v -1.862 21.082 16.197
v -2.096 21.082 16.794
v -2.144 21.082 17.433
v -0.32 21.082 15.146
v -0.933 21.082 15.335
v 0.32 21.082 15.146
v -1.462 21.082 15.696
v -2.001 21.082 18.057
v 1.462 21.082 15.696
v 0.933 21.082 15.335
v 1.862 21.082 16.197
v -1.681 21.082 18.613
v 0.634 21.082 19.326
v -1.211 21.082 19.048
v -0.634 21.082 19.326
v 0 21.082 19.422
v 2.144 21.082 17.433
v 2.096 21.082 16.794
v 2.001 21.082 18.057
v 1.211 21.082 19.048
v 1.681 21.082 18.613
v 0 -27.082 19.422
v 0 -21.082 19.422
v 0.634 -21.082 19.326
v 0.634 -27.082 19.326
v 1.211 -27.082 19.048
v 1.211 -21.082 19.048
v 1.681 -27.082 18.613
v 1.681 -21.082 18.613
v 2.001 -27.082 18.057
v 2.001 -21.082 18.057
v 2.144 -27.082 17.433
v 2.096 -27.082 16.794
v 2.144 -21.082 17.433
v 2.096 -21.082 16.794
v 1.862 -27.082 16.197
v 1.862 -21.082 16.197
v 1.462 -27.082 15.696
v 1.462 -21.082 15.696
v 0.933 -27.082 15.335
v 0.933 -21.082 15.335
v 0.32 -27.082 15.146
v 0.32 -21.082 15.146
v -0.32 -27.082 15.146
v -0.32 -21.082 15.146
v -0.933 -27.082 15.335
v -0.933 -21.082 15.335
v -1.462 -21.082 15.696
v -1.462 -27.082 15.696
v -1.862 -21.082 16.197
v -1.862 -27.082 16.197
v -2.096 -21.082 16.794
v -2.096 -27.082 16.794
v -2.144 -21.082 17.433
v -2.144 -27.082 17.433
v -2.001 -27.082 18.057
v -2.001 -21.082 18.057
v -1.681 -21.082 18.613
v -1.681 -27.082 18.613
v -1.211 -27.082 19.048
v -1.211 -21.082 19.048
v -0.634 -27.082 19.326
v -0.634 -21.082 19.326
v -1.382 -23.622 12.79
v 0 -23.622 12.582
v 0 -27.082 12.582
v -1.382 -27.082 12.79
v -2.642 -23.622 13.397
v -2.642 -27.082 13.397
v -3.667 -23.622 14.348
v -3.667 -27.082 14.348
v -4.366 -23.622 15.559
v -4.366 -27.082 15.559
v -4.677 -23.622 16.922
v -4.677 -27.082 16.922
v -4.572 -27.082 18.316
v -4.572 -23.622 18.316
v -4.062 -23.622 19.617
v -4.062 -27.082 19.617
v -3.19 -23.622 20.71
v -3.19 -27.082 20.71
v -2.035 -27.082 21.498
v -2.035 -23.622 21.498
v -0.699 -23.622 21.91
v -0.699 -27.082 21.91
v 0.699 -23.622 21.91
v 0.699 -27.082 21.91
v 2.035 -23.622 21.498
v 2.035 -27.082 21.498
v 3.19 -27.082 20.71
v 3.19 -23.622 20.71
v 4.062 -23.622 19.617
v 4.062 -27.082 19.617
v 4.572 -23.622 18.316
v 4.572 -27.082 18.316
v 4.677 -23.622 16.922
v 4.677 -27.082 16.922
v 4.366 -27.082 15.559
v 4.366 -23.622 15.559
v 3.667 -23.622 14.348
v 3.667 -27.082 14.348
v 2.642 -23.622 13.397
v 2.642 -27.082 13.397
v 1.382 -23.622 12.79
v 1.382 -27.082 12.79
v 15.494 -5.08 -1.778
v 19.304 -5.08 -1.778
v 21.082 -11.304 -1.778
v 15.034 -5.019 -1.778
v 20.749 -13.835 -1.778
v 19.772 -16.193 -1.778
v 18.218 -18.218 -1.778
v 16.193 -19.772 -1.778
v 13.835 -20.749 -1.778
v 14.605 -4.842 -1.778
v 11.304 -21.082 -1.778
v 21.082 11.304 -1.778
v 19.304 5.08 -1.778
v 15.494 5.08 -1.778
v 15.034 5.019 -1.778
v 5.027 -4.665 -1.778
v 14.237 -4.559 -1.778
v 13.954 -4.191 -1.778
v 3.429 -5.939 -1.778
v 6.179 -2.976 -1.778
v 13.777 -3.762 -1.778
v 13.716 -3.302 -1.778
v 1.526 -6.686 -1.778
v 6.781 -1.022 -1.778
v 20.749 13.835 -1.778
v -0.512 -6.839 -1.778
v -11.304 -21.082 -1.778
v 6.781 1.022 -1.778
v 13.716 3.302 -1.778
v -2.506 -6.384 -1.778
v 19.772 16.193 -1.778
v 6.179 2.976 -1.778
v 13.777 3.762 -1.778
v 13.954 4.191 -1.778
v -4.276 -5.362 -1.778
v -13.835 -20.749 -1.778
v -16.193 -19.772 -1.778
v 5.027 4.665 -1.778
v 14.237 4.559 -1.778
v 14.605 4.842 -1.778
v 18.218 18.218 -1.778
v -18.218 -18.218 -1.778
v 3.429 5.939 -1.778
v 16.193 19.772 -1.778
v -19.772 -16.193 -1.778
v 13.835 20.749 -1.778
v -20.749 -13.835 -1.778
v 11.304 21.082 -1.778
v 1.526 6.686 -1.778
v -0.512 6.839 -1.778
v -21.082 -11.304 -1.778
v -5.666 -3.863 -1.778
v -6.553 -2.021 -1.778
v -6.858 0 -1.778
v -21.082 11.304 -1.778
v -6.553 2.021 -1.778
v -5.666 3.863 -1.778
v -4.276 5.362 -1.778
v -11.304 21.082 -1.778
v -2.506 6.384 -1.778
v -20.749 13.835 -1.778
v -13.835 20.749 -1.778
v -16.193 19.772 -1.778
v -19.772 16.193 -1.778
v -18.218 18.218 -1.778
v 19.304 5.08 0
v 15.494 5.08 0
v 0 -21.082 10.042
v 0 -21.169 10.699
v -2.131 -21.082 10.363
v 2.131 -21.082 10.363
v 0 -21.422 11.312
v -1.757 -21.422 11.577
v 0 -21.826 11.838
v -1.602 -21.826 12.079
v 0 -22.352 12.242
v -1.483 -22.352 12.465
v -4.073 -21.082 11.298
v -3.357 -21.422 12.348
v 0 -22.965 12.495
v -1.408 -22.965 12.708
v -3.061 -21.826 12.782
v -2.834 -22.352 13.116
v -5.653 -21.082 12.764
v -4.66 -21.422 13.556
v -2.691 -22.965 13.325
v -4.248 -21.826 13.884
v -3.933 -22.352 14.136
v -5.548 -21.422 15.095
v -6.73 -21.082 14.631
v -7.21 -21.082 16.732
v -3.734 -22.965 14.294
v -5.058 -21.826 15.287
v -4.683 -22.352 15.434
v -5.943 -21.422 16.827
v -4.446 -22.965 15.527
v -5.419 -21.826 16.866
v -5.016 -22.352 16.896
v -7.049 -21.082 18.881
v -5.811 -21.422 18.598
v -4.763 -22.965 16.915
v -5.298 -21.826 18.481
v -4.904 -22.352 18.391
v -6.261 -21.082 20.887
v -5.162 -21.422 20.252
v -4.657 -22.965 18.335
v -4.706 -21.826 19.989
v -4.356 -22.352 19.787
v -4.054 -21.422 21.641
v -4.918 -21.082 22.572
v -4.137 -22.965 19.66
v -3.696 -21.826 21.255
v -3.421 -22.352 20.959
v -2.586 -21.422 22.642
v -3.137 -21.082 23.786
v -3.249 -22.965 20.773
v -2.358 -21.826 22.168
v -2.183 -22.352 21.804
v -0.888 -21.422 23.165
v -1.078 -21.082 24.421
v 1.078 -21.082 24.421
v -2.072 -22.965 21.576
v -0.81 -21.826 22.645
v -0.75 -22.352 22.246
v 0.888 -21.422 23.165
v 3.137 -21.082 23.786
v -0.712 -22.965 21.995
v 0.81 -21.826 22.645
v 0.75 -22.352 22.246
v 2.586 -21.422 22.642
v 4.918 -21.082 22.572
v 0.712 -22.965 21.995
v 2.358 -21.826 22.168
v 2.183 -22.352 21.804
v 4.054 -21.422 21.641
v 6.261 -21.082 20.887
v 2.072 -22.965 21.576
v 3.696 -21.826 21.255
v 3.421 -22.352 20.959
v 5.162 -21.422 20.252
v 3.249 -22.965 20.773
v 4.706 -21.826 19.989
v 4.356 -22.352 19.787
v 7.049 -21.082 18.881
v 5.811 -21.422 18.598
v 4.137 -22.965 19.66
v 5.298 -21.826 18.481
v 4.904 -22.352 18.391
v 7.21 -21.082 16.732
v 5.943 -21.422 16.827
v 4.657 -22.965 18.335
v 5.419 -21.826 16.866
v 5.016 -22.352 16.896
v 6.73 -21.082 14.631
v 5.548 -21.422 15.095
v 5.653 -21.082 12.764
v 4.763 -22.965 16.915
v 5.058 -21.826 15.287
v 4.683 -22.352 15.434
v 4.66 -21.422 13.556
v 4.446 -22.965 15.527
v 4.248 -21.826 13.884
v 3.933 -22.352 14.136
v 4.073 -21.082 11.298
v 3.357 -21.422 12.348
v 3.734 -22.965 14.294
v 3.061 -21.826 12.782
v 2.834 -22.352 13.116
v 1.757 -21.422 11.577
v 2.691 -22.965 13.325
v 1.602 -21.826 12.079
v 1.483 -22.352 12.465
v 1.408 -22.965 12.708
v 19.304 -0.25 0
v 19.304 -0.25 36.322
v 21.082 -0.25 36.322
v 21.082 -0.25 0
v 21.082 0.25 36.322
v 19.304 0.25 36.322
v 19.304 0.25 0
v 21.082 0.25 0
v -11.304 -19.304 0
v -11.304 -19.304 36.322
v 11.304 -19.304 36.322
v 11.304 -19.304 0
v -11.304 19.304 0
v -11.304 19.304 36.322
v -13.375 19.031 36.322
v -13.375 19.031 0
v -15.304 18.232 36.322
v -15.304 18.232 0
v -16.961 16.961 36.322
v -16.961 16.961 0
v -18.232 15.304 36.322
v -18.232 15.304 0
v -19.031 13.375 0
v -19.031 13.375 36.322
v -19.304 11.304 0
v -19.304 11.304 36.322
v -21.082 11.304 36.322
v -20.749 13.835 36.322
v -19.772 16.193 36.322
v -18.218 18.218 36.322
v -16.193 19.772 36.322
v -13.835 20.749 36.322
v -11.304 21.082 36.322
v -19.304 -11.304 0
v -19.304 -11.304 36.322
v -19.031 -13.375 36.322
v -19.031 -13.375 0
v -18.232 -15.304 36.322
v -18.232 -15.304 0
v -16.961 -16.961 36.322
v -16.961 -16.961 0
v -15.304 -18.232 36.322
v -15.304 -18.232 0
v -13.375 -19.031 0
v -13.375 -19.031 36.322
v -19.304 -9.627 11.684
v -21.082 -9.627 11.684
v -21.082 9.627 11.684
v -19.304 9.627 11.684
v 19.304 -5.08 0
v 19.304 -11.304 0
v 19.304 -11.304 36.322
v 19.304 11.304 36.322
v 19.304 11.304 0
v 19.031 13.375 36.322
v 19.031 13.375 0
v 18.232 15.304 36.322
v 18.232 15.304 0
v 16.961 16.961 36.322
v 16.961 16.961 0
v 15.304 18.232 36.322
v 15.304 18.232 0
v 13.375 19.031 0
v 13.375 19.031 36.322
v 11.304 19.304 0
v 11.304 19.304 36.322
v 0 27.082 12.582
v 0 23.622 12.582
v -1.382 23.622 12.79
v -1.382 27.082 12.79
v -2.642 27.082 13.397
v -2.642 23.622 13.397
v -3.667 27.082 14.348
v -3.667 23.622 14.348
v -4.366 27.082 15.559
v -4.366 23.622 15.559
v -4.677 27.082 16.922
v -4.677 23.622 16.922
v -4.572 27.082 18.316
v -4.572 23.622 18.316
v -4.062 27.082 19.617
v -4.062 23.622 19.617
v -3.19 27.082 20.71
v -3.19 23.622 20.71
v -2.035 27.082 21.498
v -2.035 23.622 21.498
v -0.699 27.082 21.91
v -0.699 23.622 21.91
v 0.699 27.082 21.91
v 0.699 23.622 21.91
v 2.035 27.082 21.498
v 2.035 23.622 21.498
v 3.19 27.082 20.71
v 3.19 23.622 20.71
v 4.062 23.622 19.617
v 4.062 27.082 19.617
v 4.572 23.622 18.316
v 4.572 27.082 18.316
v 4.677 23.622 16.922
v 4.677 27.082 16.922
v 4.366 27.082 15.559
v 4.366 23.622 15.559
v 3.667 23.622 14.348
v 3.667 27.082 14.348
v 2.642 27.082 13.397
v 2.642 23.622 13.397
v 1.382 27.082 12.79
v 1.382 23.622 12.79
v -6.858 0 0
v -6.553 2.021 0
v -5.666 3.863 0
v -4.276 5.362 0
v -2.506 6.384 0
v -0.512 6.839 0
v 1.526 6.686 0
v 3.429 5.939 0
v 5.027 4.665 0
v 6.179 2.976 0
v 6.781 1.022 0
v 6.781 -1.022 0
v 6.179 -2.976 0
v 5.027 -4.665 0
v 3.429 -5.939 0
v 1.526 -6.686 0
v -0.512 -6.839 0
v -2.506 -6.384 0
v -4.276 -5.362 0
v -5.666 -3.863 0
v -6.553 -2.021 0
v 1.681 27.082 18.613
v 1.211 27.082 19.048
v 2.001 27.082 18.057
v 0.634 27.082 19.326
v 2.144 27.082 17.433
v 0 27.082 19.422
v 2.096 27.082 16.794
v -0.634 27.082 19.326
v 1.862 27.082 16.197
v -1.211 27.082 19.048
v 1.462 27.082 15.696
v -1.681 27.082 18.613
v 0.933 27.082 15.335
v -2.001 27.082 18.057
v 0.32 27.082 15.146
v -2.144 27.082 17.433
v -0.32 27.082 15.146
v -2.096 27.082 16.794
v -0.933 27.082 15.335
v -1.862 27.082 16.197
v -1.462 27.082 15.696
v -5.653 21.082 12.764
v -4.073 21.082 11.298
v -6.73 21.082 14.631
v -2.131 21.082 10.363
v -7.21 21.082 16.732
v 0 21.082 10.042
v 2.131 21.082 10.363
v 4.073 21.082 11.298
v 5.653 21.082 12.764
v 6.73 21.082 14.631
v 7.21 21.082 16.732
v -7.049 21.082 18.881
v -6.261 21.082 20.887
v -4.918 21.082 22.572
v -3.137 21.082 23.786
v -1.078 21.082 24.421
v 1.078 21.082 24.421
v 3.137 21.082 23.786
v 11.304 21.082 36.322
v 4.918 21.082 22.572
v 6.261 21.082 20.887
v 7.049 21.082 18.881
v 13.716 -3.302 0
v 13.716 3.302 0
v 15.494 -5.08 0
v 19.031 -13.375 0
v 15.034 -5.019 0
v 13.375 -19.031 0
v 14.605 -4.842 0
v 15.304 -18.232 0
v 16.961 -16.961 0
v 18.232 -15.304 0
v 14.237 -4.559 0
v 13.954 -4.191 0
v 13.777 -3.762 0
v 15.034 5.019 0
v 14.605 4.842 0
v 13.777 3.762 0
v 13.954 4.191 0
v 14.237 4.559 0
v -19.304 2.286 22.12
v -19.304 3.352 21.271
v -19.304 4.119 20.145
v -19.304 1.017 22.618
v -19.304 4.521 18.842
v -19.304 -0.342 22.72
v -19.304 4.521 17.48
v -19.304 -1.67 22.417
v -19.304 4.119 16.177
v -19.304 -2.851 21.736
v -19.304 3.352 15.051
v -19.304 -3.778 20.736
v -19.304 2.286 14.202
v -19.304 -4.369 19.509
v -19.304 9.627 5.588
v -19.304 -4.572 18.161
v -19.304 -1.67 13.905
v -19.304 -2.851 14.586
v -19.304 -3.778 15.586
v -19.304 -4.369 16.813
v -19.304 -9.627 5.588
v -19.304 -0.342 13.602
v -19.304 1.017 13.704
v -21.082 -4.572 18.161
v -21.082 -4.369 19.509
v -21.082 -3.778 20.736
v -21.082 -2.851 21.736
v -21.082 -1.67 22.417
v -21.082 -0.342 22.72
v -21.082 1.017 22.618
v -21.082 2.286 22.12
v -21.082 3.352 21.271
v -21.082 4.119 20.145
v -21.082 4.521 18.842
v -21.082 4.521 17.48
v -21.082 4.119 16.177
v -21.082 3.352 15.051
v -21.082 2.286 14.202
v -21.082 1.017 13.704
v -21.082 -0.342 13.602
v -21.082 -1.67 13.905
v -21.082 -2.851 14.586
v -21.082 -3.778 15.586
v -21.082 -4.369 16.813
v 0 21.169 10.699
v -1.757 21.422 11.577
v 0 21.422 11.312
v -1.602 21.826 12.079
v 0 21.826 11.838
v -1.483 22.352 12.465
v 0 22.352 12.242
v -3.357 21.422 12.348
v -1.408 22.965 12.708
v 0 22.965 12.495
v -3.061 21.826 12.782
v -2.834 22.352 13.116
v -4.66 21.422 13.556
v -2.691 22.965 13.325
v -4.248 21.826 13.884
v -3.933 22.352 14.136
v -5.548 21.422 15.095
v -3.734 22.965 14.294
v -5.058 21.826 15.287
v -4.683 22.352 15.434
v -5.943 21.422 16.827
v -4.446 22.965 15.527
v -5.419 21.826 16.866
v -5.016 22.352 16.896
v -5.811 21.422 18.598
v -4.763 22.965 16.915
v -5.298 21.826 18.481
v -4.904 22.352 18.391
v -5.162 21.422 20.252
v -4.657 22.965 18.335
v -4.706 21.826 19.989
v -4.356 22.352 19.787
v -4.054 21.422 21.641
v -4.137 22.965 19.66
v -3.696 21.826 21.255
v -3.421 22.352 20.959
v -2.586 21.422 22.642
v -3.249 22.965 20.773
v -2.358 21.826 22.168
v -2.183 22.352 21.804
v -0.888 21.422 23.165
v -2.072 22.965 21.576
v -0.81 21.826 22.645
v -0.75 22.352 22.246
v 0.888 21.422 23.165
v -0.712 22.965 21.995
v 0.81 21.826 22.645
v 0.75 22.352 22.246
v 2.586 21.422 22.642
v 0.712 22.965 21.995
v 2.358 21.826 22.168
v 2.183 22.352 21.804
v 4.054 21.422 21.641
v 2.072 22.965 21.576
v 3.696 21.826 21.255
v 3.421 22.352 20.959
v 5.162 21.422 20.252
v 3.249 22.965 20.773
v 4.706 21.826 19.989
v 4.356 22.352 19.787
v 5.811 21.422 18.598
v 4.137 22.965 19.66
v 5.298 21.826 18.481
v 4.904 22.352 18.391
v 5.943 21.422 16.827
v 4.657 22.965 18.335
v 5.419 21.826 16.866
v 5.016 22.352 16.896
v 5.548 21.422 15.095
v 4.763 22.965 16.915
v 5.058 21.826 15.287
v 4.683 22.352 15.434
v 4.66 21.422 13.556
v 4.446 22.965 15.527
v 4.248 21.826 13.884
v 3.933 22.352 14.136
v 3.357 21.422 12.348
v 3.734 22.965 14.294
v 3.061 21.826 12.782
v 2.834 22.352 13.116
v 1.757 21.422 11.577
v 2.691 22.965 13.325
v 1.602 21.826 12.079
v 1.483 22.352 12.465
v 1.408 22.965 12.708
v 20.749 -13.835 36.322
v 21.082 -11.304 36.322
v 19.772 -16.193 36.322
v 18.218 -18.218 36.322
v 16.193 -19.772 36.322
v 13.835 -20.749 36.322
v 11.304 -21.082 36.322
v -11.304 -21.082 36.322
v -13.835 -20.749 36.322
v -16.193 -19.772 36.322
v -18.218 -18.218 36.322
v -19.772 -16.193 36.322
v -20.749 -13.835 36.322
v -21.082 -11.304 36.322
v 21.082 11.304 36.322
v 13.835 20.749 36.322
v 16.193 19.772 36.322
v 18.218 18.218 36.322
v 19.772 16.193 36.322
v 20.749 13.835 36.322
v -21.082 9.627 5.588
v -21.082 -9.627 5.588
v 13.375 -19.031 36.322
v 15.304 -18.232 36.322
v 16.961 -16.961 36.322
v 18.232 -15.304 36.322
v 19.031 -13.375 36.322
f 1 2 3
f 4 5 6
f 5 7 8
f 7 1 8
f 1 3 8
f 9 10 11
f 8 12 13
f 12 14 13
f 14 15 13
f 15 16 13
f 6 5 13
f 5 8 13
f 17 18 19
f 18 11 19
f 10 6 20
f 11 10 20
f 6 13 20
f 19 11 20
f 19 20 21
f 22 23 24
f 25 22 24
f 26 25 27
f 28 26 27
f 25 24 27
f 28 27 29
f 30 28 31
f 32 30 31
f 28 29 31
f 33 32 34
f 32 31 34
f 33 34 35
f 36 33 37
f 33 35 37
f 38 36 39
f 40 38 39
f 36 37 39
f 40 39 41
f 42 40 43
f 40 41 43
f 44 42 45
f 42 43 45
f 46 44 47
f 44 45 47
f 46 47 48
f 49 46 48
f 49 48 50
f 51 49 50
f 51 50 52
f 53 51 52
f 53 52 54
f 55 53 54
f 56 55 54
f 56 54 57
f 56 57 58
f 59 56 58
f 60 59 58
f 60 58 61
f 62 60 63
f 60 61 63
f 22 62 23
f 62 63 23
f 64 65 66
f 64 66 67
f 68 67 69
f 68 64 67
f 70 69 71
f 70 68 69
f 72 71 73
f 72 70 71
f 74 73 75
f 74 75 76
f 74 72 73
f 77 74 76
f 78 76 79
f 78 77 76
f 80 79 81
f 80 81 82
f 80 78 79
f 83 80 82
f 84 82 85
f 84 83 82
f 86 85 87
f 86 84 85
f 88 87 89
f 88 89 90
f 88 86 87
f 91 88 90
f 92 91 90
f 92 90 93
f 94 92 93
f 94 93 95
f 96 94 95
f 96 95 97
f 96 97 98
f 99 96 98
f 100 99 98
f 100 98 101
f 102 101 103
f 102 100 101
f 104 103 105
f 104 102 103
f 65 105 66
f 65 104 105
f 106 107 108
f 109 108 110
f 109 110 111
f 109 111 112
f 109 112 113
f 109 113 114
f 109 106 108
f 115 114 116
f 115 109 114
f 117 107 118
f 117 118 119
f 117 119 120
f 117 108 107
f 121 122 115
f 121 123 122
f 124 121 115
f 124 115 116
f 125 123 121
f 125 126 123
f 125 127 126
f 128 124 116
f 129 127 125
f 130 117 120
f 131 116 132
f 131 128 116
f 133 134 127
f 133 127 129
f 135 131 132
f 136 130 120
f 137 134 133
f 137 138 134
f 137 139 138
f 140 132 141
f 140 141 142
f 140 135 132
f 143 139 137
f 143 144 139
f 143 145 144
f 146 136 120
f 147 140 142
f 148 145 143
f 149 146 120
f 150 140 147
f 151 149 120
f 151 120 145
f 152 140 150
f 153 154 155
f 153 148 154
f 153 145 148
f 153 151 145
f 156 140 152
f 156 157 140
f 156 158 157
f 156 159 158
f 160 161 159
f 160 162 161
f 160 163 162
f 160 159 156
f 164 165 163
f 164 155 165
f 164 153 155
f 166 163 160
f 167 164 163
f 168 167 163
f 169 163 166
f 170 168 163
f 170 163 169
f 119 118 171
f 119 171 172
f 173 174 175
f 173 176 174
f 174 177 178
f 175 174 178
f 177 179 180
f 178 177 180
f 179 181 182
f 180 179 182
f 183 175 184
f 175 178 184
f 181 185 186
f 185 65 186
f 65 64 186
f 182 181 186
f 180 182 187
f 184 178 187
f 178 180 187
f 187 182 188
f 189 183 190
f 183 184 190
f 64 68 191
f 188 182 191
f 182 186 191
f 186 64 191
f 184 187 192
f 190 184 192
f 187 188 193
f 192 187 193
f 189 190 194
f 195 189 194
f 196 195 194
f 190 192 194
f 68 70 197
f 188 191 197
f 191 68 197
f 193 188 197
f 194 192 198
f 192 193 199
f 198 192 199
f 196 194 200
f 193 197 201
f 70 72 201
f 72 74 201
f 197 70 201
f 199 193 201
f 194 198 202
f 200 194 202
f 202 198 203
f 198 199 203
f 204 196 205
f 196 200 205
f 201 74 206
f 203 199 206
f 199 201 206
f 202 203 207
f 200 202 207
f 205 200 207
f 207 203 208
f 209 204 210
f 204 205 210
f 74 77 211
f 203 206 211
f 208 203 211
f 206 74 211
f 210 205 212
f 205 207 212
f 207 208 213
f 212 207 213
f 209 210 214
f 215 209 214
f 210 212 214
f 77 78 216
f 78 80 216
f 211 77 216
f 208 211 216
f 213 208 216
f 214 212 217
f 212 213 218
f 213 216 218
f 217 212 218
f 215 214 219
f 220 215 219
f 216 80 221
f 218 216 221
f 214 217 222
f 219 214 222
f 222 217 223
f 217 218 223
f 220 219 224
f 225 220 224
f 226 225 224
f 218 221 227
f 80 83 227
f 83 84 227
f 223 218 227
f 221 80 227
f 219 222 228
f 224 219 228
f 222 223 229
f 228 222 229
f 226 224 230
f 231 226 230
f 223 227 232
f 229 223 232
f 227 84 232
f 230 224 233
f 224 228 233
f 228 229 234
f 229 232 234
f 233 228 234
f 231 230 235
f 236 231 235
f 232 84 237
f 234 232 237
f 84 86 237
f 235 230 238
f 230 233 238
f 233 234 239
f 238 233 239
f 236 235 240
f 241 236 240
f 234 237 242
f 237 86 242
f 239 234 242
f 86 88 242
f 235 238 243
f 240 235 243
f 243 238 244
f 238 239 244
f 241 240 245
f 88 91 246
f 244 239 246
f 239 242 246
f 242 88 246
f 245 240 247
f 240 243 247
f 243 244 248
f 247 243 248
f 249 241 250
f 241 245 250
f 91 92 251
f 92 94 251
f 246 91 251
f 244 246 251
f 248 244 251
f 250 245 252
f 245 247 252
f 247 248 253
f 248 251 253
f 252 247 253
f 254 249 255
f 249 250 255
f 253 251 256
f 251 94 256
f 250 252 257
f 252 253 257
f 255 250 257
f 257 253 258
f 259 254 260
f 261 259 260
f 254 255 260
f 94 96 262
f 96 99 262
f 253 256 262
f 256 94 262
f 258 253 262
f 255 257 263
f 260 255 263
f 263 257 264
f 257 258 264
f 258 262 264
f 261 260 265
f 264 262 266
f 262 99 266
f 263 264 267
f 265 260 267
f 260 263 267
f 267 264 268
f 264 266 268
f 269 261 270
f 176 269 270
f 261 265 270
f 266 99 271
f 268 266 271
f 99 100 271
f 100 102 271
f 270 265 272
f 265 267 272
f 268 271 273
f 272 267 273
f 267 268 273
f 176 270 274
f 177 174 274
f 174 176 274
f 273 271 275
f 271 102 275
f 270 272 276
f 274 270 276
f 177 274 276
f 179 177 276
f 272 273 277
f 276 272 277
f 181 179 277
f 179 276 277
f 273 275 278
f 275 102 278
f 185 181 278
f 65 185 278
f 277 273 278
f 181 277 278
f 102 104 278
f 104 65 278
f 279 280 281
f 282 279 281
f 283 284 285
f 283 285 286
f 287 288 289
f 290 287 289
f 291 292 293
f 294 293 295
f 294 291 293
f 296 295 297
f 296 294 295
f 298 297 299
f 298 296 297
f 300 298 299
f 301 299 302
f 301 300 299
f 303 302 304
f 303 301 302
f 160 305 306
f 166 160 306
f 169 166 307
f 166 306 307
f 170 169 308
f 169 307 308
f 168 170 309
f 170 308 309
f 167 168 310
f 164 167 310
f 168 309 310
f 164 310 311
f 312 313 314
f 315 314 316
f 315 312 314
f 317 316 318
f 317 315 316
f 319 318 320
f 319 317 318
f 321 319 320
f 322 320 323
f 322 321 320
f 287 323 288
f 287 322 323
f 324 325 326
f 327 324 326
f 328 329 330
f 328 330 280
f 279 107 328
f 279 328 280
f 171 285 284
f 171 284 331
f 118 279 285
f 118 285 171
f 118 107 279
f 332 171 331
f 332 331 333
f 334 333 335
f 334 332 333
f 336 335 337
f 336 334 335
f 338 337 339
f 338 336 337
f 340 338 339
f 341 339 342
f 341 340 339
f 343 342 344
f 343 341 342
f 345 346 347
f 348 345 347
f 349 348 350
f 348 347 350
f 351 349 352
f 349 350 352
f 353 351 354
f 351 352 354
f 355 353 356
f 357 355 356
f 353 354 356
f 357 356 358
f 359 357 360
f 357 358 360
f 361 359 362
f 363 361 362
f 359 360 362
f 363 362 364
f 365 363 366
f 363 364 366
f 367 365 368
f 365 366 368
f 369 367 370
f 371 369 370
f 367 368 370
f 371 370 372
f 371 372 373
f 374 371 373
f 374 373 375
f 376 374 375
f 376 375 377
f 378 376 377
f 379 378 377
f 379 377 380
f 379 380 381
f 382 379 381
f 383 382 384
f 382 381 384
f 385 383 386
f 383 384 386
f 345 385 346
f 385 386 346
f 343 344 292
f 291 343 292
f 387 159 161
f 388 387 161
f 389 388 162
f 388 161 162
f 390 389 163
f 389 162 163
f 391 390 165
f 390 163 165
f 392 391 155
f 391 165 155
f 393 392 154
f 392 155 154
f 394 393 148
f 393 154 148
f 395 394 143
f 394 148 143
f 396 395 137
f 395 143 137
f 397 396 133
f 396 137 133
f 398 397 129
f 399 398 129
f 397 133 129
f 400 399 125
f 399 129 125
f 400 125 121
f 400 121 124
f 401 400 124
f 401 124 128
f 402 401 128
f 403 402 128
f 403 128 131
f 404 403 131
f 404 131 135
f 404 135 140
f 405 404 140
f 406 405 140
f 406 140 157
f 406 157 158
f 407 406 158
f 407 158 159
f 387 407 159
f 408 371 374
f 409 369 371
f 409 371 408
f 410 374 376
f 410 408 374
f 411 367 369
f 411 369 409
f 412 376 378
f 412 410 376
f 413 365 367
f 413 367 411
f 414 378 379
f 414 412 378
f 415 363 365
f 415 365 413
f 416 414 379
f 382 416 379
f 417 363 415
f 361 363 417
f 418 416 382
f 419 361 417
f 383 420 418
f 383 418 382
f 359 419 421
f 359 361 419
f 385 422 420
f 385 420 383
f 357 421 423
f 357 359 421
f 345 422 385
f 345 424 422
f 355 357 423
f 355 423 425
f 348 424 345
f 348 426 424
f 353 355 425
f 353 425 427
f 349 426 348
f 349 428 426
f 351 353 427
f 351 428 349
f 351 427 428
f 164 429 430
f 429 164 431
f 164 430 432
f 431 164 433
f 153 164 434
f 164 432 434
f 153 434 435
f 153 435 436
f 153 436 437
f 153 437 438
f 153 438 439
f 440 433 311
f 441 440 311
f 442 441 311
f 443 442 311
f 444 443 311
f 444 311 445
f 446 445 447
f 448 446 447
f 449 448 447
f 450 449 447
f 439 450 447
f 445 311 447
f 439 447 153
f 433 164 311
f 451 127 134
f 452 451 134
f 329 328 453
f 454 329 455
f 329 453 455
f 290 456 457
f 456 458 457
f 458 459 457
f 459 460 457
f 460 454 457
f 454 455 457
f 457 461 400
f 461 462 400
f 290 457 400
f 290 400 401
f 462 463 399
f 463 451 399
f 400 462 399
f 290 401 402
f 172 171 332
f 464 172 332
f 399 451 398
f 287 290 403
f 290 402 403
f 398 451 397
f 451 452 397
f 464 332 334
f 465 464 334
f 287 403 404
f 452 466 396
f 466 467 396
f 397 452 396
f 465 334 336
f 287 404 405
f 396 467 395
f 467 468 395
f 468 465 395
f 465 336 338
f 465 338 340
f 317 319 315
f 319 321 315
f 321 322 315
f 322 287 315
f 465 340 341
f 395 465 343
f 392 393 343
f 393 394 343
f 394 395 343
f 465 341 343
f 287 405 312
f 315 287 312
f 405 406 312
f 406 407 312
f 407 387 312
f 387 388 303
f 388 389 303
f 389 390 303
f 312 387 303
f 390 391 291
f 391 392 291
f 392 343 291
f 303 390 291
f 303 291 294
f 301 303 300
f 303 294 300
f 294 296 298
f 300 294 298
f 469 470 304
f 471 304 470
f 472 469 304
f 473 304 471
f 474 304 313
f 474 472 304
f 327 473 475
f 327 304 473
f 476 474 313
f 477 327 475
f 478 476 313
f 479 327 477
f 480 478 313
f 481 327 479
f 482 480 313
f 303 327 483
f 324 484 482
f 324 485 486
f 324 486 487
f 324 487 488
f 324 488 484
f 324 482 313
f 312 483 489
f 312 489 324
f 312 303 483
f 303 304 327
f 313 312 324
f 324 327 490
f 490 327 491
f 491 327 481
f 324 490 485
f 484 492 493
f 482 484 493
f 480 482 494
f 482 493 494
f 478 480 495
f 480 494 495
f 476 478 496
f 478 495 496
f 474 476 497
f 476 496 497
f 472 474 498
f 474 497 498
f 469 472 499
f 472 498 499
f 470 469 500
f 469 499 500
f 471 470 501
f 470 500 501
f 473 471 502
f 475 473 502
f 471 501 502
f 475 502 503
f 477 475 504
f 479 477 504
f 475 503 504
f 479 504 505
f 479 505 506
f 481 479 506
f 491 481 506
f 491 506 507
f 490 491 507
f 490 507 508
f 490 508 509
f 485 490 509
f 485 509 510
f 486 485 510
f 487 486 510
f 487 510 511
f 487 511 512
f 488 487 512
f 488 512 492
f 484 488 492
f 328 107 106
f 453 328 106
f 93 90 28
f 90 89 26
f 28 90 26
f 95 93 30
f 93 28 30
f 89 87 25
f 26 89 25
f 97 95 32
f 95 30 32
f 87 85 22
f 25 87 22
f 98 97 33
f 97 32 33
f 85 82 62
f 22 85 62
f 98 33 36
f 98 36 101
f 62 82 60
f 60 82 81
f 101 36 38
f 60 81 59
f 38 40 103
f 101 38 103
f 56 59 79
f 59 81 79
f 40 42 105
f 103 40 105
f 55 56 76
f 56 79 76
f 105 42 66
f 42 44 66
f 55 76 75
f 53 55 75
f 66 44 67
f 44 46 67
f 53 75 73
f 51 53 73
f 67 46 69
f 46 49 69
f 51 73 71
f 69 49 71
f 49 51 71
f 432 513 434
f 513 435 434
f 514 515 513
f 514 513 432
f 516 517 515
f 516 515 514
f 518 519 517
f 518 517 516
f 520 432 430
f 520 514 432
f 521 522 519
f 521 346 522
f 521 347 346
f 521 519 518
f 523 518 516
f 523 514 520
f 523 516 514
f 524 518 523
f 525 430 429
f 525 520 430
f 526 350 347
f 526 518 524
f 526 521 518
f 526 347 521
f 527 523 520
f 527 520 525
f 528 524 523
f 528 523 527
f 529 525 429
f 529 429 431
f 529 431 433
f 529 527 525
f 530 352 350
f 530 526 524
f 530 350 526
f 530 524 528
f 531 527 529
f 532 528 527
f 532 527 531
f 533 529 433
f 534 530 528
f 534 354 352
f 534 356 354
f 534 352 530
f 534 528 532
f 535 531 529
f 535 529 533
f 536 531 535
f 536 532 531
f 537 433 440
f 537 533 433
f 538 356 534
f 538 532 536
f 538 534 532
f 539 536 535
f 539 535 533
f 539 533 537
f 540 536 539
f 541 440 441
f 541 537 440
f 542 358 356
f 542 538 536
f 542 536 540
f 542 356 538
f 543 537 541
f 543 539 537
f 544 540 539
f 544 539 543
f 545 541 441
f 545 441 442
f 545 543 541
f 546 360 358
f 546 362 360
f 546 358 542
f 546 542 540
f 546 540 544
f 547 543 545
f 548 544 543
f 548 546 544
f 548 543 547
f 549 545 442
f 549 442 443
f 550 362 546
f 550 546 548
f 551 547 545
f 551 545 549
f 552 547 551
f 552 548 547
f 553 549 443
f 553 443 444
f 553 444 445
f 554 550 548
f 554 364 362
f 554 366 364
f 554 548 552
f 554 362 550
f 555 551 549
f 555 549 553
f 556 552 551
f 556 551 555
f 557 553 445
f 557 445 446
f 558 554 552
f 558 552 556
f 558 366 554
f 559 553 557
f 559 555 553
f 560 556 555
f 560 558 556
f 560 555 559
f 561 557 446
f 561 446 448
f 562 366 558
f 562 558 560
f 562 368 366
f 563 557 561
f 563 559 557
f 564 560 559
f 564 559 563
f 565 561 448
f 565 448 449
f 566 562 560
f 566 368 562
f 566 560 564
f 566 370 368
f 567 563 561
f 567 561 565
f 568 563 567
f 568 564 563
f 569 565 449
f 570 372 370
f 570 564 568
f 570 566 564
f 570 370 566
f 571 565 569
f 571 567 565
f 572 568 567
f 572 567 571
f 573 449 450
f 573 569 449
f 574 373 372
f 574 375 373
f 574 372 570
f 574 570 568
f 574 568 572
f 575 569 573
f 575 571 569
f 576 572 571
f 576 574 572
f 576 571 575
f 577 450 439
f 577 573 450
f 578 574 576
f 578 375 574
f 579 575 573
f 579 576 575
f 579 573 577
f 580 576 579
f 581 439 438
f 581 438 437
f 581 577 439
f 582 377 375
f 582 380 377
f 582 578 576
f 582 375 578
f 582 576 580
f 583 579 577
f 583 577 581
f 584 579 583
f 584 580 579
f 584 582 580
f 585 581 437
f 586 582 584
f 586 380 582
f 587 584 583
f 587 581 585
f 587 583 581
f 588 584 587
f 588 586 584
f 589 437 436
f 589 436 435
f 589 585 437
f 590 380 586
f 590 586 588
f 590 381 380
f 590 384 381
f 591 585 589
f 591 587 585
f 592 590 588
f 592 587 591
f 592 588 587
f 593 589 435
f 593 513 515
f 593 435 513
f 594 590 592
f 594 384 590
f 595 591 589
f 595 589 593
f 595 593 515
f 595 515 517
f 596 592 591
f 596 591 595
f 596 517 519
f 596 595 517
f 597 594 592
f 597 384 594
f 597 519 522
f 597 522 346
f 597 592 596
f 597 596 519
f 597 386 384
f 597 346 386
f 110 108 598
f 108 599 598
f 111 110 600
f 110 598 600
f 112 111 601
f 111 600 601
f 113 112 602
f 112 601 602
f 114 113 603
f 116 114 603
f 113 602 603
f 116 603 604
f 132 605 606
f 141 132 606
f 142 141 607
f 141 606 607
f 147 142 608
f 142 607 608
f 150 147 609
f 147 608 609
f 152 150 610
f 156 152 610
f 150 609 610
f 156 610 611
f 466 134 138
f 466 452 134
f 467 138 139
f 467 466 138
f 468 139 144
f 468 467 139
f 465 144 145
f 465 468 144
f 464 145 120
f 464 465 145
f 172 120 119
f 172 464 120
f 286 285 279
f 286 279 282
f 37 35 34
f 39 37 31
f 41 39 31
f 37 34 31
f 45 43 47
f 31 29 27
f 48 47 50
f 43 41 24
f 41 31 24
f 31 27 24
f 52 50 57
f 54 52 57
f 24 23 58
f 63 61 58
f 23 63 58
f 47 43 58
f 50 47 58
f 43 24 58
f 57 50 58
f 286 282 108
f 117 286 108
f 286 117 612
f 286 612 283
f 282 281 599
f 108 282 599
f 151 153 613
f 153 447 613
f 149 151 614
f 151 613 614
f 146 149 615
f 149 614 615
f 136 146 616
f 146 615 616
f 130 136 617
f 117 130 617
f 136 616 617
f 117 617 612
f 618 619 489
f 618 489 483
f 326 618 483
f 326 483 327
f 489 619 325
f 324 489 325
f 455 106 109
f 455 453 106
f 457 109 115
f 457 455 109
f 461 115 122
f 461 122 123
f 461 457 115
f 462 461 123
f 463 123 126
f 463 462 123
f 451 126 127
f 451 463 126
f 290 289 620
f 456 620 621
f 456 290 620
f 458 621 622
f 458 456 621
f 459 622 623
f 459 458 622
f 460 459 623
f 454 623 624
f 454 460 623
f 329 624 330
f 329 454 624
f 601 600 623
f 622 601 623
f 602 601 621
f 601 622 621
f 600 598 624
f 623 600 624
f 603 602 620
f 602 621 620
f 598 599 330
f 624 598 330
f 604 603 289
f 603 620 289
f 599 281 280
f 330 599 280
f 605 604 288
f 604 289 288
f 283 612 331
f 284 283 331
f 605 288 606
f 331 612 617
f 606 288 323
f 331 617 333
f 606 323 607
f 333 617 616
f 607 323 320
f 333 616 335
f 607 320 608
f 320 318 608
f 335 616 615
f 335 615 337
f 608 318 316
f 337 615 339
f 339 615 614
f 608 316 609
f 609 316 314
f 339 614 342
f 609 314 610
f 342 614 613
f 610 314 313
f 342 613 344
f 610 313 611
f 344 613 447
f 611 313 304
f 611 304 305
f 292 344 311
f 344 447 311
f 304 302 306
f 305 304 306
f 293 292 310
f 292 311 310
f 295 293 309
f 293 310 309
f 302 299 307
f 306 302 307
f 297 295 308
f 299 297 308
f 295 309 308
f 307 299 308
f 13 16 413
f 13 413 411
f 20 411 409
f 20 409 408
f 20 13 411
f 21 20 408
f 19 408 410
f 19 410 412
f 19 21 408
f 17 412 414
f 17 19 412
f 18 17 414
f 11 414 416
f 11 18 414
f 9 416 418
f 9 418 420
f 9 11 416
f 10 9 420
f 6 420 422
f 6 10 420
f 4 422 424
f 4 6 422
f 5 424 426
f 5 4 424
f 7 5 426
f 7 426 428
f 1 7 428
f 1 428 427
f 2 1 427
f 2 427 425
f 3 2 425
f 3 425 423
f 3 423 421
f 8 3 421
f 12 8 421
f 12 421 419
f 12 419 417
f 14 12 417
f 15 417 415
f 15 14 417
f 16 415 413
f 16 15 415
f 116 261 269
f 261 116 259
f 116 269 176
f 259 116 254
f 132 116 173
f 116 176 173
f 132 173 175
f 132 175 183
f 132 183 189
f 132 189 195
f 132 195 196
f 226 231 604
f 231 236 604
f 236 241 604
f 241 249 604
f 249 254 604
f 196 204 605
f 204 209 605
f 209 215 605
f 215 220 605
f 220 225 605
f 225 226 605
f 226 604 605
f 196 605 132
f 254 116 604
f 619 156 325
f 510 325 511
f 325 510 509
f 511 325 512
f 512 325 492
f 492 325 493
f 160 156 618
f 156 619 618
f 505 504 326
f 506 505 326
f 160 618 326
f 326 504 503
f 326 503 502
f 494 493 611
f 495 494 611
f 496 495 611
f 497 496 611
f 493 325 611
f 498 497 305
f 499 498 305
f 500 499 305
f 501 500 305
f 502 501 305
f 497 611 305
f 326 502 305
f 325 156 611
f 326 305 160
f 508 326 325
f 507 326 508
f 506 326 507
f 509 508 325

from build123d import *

# Parameters (mm, degrees)
BOSS_EXTRUDE1_DEPTH = 36.322
CUT_EXTRUDE1_REACH  = 61.511
SKETCH2_R           = 4.572
SKETCH2_W           = 6.096
SKETCH2_H           = 19.2532
BOSS_EXTRUDE2_DEPTH = 1.778
CUT_EXTRUDE2_REACH  = 50.379
SKETCH3_R           = 6.858
SKETCH4_R           = 4.69
SKETCH4_R_2         = 2.15
BOSS_EXTRUDE3_DEPTH = 6
FILLET1_R           = 2.54
CUT_EXTRUDE3_REACH  = 53.279
SKETCH5_W           = 5.588
SKETCH5_H           = 10.16
FILLET2_R           = 1.778
SKETCH6_W           = 1.778
SKETCH6_H           = 0.5
CUT_EXTRUDE4_DEPTH  = 36.322


with BuildPart() as part:
    # Sketch1 → Boss-Extrude1 (new body)
    with BuildSketch(Plane.XY):
        with BuildLine():
            Line((-11.304, 21.082), (11.304, 21.082))
            ThreePointArc((11.304, 21.082), (18.218090106, 18.218090106), (21.082, 11.304))
            Line((21.082, 11.304), (21.082, -11.304))
            ThreePointArc((21.082, -11.304), (18.218090106, -18.218090106), (11.304, -21.082))
            Line((11.304, -21.082), (-11.304, -21.082))
            ThreePointArc((-11.304, -21.082), (-18.218090106, -18.218090106), (-21.082, -11.304))
            Line((-21.082, -11.304), (-21.082, 11.304))
            ThreePointArc((-21.082, 11.304), (-18.218090106, 18.218090106), (-11.304, 21.082))
        make_face()
        with BuildLine():
            Line((-11.304, -19.304), (11.304, -19.304))
            ThreePointArc((11.304, -19.304), (16.960854249, -16.960854249), (19.304, -11.304))
            Line((19.304, -11.304), (19.304, 11.304))
            ThreePointArc((19.304, 11.304), (16.960854249, 16.960854249), (11.304, 19.304))
            Line((11.304, 19.304), (-11.304, 19.304))
            ThreePointArc((-11.304, 19.304), (-16.960854249, 16.960854249), (-19.304, 11.304))
            Line((-19.304, 11.304), (-19.304, -11.304))
            ThreePointArc((-19.304, -11.304), (-16.960854249, -16.960854249), (-11.304, -19.304))
        make_face(mode=Mode.SUBTRACT)
    extrude(amount=BOSS_EXTRUDE1_DEPTH)

    # Sketch2 → Cut-Extrude1 (cut, up to next)
    with BuildSketch(Plane.ZY.offset(21.082), mode=Mode.PRIVATE) as cut_extrude1_sk1:
        with Locations(Location((18.161, 0, 0), (0, 0, 270))):
            Circle(SKETCH2_R)
    cut_extrude1_tool1 = extrude(cut_extrude1_sk1.sketch, amount=-CUT_EXTRUDE1_REACH, mode=Mode.PRIVATE) & part.part
    # Sketch2 → Cut-Extrude1 (cut, up to next)
    with BuildSketch(Plane.ZY.offset(21.082), mode=Mode.PRIVATE) as cut_extrude1_sk2:
        with Locations((8.636, 0)):
            Rectangle(SKETCH2_W, SKETCH2_H)
    cut_extrude1_tool2 = extrude(cut_extrude1_sk2.sketch, amount=-CUT_EXTRUDE1_REACH, mode=Mode.PRIVATE) & part.part
    add(cut_extrude1_tool1.solids().sort_by_distance((-21.082, 0, 18.161))[0], mode=Mode.SUBTRACT)
    add(cut_extrude1_tool2.solids().sort_by_distance((-21.082, 0, 8.636))[0], mode=Mode.SUBTRACT)

    # Sketch1<2> → Boss-Extrude2 (add)
    with BuildSketch(Plane.XY):
        with BuildLine():
            ThreePointArc((-21.082, 11.304), (-18.218090106, 18.218090106), (-11.304, 21.082))
            Line((-11.304, 21.082), (11.304, 21.082))
            ThreePointArc((11.304, 21.082), (18.218090106, 18.218090106), (21.082, 11.304))
            Line((21.082, 11.304), (21.082, -11.304))
            ThreePointArc((21.082, -11.304), (18.218090106, -18.218090106), (11.304, -21.082))
            Line((11.304, -21.082), (-11.304, -21.082))
            ThreePointArc((-11.304, -21.082), (-18.218090106, -18.218090106), (-21.082, -11.304))
            Line((-21.082, -11.304), (-21.082, 11.304))
        make_face()
        with BuildLine():
            Line((-19.304, -11.304), (-19.304, 11.304))
            ThreePointArc((-19.304, 11.304), (-16.960854249, 16.960854249), (-11.304, 19.304))
            Line((-11.304, 19.304), (11.304, 19.304))
            ThreePointArc((11.304, 19.304), (16.960854249, 16.960854249), (19.304, 11.304))
            Line((19.304, 11.304), (19.304, -11.304))
            ThreePointArc((19.304, -11.304), (16.960854249, -16.960854249), (11.304, -19.304))
            Line((11.304, -19.304), (-11.304, -19.304))
            ThreePointArc((-11.304, -19.304), (-16.960854249, -16.960854249), (-19.304, -11.304))
        make_face(mode=Mode.SUBTRACT)
        with BuildLine():
            ThreePointArc((-19.304, 11.304), (-16.960854249, 16.960854249), (-11.304, 19.304))
            Line((-11.304, 19.304), (11.304, 19.304))
            ThreePointArc((11.304, 19.304), (16.960854249, 16.960854249), (19.304, 11.304))
            Line((19.304, 11.304), (19.304, -11.304))
            ThreePointArc((19.304, -11.304), (16.960854249, -16.960854249), (11.304, -19.304))
            Line((11.304, -19.304), (-11.304, -19.304))
            ThreePointArc((-11.304, -19.304), (-16.960854249, -16.960854249), (-19.304, -11.304))
            Line((-19.304, -11.304), (-19.304, 11.304))
        make_face()
    extrude(amount=-BOSS_EXTRUDE2_DEPTH)

    # Sketch3 → Cut-Extrude2 (cut, up to next)
    with BuildSketch(Plane(origin=(0, 0, -1.778), x_dir=(-1, 0, 0), z_dir=(0, 0, -1)), mode=Mode.PRIVATE) as cut_extrude2_sk1:
        Circle(SKETCH3_R)
    cut_extrude2_tool1 = extrude(cut_extrude2_sk1.sketch, amount=-CUT_EXTRUDE2_REACH, mode=Mode.PRIVATE) & part.part
    add(cut_extrude2_tool1.solids().sort_by_distance((0, 0, -1.778))[0], mode=Mode.SUBTRACT)

    # Sketch4 → Boss-Extrude3 (add)
    with BuildSketch(Plane(origin=(0, 21.082, 0), x_dir=(1, 0, 0), z_dir=(0, 1, 0))):
        with Locations(Location((0, -17.272, 0), (0, 0, 90))):
            Circle(SKETCH4_R)
        with Locations(Location((0, -17.272, 0), (0, 0, 270))):
            Circle(SKETCH4_R_2, mode=Mode.SUBTRACT)
    boss_extrude3 = extrude(amount=BOSS_EXTRUDE3_DEPTH)

    # Mirror1: Boss-Extrude3 across plane
    add(boss_extrude3.mirror(Plane.ZX))

    # Fillet1
    fillet1_edges = [part.edges().sort_by_distance(p)[0] for p in [
        (0, 21.082, 21.962),
        (0, -21.082, 21.962),
    ]]
    fillet(fillet1_edges, radius=FILLET1_R)

    # Sketch5 → Cut-Extrude3 (cut, up to next)
    with BuildSketch(Plane(origin=(0, 0, -1.778), x_dir=(-1, 0, 0), z_dir=(0, 0, -1)), mode=Mode.PRIVATE) as cut_extrude3_sk1:
        with Locations((-16.51, 0)):
            Rectangle(SKETCH5_W, SKETCH5_H)
    cut_extrude3_tool1 = extrude(cut_extrude3_sk1.sketch, amount=-CUT_EXTRUDE3_REACH, mode=Mode.PRIVATE) & part.part
    add(cut_extrude3_tool1.solids().sort_by_distance((16.51, 0, -1.778))[0], mode=Mode.SUBTRACT)

    # Fillet2
    fillet2_edges = [part.edges().sort_by_distance(p)[0] for p in [
        (13.716, 5.08, -0.889),
        (13.716, -5.08, -0.889),
    ]]
    fillet(fillet2_edges, radius=FILLET2_R)

    # Sketch6 → Cut-Extrude4 (cut)
    with BuildSketch(Plane.XY.offset(36.322)):
        with Locations((20.193, 0)):
            Rectangle(SKETCH6_W, SKETCH6_H)
    extrude(amount=-CUT_EXTRUDE4_DEPTH, mode=Mode.SUBTRACT)


solid = part.part
